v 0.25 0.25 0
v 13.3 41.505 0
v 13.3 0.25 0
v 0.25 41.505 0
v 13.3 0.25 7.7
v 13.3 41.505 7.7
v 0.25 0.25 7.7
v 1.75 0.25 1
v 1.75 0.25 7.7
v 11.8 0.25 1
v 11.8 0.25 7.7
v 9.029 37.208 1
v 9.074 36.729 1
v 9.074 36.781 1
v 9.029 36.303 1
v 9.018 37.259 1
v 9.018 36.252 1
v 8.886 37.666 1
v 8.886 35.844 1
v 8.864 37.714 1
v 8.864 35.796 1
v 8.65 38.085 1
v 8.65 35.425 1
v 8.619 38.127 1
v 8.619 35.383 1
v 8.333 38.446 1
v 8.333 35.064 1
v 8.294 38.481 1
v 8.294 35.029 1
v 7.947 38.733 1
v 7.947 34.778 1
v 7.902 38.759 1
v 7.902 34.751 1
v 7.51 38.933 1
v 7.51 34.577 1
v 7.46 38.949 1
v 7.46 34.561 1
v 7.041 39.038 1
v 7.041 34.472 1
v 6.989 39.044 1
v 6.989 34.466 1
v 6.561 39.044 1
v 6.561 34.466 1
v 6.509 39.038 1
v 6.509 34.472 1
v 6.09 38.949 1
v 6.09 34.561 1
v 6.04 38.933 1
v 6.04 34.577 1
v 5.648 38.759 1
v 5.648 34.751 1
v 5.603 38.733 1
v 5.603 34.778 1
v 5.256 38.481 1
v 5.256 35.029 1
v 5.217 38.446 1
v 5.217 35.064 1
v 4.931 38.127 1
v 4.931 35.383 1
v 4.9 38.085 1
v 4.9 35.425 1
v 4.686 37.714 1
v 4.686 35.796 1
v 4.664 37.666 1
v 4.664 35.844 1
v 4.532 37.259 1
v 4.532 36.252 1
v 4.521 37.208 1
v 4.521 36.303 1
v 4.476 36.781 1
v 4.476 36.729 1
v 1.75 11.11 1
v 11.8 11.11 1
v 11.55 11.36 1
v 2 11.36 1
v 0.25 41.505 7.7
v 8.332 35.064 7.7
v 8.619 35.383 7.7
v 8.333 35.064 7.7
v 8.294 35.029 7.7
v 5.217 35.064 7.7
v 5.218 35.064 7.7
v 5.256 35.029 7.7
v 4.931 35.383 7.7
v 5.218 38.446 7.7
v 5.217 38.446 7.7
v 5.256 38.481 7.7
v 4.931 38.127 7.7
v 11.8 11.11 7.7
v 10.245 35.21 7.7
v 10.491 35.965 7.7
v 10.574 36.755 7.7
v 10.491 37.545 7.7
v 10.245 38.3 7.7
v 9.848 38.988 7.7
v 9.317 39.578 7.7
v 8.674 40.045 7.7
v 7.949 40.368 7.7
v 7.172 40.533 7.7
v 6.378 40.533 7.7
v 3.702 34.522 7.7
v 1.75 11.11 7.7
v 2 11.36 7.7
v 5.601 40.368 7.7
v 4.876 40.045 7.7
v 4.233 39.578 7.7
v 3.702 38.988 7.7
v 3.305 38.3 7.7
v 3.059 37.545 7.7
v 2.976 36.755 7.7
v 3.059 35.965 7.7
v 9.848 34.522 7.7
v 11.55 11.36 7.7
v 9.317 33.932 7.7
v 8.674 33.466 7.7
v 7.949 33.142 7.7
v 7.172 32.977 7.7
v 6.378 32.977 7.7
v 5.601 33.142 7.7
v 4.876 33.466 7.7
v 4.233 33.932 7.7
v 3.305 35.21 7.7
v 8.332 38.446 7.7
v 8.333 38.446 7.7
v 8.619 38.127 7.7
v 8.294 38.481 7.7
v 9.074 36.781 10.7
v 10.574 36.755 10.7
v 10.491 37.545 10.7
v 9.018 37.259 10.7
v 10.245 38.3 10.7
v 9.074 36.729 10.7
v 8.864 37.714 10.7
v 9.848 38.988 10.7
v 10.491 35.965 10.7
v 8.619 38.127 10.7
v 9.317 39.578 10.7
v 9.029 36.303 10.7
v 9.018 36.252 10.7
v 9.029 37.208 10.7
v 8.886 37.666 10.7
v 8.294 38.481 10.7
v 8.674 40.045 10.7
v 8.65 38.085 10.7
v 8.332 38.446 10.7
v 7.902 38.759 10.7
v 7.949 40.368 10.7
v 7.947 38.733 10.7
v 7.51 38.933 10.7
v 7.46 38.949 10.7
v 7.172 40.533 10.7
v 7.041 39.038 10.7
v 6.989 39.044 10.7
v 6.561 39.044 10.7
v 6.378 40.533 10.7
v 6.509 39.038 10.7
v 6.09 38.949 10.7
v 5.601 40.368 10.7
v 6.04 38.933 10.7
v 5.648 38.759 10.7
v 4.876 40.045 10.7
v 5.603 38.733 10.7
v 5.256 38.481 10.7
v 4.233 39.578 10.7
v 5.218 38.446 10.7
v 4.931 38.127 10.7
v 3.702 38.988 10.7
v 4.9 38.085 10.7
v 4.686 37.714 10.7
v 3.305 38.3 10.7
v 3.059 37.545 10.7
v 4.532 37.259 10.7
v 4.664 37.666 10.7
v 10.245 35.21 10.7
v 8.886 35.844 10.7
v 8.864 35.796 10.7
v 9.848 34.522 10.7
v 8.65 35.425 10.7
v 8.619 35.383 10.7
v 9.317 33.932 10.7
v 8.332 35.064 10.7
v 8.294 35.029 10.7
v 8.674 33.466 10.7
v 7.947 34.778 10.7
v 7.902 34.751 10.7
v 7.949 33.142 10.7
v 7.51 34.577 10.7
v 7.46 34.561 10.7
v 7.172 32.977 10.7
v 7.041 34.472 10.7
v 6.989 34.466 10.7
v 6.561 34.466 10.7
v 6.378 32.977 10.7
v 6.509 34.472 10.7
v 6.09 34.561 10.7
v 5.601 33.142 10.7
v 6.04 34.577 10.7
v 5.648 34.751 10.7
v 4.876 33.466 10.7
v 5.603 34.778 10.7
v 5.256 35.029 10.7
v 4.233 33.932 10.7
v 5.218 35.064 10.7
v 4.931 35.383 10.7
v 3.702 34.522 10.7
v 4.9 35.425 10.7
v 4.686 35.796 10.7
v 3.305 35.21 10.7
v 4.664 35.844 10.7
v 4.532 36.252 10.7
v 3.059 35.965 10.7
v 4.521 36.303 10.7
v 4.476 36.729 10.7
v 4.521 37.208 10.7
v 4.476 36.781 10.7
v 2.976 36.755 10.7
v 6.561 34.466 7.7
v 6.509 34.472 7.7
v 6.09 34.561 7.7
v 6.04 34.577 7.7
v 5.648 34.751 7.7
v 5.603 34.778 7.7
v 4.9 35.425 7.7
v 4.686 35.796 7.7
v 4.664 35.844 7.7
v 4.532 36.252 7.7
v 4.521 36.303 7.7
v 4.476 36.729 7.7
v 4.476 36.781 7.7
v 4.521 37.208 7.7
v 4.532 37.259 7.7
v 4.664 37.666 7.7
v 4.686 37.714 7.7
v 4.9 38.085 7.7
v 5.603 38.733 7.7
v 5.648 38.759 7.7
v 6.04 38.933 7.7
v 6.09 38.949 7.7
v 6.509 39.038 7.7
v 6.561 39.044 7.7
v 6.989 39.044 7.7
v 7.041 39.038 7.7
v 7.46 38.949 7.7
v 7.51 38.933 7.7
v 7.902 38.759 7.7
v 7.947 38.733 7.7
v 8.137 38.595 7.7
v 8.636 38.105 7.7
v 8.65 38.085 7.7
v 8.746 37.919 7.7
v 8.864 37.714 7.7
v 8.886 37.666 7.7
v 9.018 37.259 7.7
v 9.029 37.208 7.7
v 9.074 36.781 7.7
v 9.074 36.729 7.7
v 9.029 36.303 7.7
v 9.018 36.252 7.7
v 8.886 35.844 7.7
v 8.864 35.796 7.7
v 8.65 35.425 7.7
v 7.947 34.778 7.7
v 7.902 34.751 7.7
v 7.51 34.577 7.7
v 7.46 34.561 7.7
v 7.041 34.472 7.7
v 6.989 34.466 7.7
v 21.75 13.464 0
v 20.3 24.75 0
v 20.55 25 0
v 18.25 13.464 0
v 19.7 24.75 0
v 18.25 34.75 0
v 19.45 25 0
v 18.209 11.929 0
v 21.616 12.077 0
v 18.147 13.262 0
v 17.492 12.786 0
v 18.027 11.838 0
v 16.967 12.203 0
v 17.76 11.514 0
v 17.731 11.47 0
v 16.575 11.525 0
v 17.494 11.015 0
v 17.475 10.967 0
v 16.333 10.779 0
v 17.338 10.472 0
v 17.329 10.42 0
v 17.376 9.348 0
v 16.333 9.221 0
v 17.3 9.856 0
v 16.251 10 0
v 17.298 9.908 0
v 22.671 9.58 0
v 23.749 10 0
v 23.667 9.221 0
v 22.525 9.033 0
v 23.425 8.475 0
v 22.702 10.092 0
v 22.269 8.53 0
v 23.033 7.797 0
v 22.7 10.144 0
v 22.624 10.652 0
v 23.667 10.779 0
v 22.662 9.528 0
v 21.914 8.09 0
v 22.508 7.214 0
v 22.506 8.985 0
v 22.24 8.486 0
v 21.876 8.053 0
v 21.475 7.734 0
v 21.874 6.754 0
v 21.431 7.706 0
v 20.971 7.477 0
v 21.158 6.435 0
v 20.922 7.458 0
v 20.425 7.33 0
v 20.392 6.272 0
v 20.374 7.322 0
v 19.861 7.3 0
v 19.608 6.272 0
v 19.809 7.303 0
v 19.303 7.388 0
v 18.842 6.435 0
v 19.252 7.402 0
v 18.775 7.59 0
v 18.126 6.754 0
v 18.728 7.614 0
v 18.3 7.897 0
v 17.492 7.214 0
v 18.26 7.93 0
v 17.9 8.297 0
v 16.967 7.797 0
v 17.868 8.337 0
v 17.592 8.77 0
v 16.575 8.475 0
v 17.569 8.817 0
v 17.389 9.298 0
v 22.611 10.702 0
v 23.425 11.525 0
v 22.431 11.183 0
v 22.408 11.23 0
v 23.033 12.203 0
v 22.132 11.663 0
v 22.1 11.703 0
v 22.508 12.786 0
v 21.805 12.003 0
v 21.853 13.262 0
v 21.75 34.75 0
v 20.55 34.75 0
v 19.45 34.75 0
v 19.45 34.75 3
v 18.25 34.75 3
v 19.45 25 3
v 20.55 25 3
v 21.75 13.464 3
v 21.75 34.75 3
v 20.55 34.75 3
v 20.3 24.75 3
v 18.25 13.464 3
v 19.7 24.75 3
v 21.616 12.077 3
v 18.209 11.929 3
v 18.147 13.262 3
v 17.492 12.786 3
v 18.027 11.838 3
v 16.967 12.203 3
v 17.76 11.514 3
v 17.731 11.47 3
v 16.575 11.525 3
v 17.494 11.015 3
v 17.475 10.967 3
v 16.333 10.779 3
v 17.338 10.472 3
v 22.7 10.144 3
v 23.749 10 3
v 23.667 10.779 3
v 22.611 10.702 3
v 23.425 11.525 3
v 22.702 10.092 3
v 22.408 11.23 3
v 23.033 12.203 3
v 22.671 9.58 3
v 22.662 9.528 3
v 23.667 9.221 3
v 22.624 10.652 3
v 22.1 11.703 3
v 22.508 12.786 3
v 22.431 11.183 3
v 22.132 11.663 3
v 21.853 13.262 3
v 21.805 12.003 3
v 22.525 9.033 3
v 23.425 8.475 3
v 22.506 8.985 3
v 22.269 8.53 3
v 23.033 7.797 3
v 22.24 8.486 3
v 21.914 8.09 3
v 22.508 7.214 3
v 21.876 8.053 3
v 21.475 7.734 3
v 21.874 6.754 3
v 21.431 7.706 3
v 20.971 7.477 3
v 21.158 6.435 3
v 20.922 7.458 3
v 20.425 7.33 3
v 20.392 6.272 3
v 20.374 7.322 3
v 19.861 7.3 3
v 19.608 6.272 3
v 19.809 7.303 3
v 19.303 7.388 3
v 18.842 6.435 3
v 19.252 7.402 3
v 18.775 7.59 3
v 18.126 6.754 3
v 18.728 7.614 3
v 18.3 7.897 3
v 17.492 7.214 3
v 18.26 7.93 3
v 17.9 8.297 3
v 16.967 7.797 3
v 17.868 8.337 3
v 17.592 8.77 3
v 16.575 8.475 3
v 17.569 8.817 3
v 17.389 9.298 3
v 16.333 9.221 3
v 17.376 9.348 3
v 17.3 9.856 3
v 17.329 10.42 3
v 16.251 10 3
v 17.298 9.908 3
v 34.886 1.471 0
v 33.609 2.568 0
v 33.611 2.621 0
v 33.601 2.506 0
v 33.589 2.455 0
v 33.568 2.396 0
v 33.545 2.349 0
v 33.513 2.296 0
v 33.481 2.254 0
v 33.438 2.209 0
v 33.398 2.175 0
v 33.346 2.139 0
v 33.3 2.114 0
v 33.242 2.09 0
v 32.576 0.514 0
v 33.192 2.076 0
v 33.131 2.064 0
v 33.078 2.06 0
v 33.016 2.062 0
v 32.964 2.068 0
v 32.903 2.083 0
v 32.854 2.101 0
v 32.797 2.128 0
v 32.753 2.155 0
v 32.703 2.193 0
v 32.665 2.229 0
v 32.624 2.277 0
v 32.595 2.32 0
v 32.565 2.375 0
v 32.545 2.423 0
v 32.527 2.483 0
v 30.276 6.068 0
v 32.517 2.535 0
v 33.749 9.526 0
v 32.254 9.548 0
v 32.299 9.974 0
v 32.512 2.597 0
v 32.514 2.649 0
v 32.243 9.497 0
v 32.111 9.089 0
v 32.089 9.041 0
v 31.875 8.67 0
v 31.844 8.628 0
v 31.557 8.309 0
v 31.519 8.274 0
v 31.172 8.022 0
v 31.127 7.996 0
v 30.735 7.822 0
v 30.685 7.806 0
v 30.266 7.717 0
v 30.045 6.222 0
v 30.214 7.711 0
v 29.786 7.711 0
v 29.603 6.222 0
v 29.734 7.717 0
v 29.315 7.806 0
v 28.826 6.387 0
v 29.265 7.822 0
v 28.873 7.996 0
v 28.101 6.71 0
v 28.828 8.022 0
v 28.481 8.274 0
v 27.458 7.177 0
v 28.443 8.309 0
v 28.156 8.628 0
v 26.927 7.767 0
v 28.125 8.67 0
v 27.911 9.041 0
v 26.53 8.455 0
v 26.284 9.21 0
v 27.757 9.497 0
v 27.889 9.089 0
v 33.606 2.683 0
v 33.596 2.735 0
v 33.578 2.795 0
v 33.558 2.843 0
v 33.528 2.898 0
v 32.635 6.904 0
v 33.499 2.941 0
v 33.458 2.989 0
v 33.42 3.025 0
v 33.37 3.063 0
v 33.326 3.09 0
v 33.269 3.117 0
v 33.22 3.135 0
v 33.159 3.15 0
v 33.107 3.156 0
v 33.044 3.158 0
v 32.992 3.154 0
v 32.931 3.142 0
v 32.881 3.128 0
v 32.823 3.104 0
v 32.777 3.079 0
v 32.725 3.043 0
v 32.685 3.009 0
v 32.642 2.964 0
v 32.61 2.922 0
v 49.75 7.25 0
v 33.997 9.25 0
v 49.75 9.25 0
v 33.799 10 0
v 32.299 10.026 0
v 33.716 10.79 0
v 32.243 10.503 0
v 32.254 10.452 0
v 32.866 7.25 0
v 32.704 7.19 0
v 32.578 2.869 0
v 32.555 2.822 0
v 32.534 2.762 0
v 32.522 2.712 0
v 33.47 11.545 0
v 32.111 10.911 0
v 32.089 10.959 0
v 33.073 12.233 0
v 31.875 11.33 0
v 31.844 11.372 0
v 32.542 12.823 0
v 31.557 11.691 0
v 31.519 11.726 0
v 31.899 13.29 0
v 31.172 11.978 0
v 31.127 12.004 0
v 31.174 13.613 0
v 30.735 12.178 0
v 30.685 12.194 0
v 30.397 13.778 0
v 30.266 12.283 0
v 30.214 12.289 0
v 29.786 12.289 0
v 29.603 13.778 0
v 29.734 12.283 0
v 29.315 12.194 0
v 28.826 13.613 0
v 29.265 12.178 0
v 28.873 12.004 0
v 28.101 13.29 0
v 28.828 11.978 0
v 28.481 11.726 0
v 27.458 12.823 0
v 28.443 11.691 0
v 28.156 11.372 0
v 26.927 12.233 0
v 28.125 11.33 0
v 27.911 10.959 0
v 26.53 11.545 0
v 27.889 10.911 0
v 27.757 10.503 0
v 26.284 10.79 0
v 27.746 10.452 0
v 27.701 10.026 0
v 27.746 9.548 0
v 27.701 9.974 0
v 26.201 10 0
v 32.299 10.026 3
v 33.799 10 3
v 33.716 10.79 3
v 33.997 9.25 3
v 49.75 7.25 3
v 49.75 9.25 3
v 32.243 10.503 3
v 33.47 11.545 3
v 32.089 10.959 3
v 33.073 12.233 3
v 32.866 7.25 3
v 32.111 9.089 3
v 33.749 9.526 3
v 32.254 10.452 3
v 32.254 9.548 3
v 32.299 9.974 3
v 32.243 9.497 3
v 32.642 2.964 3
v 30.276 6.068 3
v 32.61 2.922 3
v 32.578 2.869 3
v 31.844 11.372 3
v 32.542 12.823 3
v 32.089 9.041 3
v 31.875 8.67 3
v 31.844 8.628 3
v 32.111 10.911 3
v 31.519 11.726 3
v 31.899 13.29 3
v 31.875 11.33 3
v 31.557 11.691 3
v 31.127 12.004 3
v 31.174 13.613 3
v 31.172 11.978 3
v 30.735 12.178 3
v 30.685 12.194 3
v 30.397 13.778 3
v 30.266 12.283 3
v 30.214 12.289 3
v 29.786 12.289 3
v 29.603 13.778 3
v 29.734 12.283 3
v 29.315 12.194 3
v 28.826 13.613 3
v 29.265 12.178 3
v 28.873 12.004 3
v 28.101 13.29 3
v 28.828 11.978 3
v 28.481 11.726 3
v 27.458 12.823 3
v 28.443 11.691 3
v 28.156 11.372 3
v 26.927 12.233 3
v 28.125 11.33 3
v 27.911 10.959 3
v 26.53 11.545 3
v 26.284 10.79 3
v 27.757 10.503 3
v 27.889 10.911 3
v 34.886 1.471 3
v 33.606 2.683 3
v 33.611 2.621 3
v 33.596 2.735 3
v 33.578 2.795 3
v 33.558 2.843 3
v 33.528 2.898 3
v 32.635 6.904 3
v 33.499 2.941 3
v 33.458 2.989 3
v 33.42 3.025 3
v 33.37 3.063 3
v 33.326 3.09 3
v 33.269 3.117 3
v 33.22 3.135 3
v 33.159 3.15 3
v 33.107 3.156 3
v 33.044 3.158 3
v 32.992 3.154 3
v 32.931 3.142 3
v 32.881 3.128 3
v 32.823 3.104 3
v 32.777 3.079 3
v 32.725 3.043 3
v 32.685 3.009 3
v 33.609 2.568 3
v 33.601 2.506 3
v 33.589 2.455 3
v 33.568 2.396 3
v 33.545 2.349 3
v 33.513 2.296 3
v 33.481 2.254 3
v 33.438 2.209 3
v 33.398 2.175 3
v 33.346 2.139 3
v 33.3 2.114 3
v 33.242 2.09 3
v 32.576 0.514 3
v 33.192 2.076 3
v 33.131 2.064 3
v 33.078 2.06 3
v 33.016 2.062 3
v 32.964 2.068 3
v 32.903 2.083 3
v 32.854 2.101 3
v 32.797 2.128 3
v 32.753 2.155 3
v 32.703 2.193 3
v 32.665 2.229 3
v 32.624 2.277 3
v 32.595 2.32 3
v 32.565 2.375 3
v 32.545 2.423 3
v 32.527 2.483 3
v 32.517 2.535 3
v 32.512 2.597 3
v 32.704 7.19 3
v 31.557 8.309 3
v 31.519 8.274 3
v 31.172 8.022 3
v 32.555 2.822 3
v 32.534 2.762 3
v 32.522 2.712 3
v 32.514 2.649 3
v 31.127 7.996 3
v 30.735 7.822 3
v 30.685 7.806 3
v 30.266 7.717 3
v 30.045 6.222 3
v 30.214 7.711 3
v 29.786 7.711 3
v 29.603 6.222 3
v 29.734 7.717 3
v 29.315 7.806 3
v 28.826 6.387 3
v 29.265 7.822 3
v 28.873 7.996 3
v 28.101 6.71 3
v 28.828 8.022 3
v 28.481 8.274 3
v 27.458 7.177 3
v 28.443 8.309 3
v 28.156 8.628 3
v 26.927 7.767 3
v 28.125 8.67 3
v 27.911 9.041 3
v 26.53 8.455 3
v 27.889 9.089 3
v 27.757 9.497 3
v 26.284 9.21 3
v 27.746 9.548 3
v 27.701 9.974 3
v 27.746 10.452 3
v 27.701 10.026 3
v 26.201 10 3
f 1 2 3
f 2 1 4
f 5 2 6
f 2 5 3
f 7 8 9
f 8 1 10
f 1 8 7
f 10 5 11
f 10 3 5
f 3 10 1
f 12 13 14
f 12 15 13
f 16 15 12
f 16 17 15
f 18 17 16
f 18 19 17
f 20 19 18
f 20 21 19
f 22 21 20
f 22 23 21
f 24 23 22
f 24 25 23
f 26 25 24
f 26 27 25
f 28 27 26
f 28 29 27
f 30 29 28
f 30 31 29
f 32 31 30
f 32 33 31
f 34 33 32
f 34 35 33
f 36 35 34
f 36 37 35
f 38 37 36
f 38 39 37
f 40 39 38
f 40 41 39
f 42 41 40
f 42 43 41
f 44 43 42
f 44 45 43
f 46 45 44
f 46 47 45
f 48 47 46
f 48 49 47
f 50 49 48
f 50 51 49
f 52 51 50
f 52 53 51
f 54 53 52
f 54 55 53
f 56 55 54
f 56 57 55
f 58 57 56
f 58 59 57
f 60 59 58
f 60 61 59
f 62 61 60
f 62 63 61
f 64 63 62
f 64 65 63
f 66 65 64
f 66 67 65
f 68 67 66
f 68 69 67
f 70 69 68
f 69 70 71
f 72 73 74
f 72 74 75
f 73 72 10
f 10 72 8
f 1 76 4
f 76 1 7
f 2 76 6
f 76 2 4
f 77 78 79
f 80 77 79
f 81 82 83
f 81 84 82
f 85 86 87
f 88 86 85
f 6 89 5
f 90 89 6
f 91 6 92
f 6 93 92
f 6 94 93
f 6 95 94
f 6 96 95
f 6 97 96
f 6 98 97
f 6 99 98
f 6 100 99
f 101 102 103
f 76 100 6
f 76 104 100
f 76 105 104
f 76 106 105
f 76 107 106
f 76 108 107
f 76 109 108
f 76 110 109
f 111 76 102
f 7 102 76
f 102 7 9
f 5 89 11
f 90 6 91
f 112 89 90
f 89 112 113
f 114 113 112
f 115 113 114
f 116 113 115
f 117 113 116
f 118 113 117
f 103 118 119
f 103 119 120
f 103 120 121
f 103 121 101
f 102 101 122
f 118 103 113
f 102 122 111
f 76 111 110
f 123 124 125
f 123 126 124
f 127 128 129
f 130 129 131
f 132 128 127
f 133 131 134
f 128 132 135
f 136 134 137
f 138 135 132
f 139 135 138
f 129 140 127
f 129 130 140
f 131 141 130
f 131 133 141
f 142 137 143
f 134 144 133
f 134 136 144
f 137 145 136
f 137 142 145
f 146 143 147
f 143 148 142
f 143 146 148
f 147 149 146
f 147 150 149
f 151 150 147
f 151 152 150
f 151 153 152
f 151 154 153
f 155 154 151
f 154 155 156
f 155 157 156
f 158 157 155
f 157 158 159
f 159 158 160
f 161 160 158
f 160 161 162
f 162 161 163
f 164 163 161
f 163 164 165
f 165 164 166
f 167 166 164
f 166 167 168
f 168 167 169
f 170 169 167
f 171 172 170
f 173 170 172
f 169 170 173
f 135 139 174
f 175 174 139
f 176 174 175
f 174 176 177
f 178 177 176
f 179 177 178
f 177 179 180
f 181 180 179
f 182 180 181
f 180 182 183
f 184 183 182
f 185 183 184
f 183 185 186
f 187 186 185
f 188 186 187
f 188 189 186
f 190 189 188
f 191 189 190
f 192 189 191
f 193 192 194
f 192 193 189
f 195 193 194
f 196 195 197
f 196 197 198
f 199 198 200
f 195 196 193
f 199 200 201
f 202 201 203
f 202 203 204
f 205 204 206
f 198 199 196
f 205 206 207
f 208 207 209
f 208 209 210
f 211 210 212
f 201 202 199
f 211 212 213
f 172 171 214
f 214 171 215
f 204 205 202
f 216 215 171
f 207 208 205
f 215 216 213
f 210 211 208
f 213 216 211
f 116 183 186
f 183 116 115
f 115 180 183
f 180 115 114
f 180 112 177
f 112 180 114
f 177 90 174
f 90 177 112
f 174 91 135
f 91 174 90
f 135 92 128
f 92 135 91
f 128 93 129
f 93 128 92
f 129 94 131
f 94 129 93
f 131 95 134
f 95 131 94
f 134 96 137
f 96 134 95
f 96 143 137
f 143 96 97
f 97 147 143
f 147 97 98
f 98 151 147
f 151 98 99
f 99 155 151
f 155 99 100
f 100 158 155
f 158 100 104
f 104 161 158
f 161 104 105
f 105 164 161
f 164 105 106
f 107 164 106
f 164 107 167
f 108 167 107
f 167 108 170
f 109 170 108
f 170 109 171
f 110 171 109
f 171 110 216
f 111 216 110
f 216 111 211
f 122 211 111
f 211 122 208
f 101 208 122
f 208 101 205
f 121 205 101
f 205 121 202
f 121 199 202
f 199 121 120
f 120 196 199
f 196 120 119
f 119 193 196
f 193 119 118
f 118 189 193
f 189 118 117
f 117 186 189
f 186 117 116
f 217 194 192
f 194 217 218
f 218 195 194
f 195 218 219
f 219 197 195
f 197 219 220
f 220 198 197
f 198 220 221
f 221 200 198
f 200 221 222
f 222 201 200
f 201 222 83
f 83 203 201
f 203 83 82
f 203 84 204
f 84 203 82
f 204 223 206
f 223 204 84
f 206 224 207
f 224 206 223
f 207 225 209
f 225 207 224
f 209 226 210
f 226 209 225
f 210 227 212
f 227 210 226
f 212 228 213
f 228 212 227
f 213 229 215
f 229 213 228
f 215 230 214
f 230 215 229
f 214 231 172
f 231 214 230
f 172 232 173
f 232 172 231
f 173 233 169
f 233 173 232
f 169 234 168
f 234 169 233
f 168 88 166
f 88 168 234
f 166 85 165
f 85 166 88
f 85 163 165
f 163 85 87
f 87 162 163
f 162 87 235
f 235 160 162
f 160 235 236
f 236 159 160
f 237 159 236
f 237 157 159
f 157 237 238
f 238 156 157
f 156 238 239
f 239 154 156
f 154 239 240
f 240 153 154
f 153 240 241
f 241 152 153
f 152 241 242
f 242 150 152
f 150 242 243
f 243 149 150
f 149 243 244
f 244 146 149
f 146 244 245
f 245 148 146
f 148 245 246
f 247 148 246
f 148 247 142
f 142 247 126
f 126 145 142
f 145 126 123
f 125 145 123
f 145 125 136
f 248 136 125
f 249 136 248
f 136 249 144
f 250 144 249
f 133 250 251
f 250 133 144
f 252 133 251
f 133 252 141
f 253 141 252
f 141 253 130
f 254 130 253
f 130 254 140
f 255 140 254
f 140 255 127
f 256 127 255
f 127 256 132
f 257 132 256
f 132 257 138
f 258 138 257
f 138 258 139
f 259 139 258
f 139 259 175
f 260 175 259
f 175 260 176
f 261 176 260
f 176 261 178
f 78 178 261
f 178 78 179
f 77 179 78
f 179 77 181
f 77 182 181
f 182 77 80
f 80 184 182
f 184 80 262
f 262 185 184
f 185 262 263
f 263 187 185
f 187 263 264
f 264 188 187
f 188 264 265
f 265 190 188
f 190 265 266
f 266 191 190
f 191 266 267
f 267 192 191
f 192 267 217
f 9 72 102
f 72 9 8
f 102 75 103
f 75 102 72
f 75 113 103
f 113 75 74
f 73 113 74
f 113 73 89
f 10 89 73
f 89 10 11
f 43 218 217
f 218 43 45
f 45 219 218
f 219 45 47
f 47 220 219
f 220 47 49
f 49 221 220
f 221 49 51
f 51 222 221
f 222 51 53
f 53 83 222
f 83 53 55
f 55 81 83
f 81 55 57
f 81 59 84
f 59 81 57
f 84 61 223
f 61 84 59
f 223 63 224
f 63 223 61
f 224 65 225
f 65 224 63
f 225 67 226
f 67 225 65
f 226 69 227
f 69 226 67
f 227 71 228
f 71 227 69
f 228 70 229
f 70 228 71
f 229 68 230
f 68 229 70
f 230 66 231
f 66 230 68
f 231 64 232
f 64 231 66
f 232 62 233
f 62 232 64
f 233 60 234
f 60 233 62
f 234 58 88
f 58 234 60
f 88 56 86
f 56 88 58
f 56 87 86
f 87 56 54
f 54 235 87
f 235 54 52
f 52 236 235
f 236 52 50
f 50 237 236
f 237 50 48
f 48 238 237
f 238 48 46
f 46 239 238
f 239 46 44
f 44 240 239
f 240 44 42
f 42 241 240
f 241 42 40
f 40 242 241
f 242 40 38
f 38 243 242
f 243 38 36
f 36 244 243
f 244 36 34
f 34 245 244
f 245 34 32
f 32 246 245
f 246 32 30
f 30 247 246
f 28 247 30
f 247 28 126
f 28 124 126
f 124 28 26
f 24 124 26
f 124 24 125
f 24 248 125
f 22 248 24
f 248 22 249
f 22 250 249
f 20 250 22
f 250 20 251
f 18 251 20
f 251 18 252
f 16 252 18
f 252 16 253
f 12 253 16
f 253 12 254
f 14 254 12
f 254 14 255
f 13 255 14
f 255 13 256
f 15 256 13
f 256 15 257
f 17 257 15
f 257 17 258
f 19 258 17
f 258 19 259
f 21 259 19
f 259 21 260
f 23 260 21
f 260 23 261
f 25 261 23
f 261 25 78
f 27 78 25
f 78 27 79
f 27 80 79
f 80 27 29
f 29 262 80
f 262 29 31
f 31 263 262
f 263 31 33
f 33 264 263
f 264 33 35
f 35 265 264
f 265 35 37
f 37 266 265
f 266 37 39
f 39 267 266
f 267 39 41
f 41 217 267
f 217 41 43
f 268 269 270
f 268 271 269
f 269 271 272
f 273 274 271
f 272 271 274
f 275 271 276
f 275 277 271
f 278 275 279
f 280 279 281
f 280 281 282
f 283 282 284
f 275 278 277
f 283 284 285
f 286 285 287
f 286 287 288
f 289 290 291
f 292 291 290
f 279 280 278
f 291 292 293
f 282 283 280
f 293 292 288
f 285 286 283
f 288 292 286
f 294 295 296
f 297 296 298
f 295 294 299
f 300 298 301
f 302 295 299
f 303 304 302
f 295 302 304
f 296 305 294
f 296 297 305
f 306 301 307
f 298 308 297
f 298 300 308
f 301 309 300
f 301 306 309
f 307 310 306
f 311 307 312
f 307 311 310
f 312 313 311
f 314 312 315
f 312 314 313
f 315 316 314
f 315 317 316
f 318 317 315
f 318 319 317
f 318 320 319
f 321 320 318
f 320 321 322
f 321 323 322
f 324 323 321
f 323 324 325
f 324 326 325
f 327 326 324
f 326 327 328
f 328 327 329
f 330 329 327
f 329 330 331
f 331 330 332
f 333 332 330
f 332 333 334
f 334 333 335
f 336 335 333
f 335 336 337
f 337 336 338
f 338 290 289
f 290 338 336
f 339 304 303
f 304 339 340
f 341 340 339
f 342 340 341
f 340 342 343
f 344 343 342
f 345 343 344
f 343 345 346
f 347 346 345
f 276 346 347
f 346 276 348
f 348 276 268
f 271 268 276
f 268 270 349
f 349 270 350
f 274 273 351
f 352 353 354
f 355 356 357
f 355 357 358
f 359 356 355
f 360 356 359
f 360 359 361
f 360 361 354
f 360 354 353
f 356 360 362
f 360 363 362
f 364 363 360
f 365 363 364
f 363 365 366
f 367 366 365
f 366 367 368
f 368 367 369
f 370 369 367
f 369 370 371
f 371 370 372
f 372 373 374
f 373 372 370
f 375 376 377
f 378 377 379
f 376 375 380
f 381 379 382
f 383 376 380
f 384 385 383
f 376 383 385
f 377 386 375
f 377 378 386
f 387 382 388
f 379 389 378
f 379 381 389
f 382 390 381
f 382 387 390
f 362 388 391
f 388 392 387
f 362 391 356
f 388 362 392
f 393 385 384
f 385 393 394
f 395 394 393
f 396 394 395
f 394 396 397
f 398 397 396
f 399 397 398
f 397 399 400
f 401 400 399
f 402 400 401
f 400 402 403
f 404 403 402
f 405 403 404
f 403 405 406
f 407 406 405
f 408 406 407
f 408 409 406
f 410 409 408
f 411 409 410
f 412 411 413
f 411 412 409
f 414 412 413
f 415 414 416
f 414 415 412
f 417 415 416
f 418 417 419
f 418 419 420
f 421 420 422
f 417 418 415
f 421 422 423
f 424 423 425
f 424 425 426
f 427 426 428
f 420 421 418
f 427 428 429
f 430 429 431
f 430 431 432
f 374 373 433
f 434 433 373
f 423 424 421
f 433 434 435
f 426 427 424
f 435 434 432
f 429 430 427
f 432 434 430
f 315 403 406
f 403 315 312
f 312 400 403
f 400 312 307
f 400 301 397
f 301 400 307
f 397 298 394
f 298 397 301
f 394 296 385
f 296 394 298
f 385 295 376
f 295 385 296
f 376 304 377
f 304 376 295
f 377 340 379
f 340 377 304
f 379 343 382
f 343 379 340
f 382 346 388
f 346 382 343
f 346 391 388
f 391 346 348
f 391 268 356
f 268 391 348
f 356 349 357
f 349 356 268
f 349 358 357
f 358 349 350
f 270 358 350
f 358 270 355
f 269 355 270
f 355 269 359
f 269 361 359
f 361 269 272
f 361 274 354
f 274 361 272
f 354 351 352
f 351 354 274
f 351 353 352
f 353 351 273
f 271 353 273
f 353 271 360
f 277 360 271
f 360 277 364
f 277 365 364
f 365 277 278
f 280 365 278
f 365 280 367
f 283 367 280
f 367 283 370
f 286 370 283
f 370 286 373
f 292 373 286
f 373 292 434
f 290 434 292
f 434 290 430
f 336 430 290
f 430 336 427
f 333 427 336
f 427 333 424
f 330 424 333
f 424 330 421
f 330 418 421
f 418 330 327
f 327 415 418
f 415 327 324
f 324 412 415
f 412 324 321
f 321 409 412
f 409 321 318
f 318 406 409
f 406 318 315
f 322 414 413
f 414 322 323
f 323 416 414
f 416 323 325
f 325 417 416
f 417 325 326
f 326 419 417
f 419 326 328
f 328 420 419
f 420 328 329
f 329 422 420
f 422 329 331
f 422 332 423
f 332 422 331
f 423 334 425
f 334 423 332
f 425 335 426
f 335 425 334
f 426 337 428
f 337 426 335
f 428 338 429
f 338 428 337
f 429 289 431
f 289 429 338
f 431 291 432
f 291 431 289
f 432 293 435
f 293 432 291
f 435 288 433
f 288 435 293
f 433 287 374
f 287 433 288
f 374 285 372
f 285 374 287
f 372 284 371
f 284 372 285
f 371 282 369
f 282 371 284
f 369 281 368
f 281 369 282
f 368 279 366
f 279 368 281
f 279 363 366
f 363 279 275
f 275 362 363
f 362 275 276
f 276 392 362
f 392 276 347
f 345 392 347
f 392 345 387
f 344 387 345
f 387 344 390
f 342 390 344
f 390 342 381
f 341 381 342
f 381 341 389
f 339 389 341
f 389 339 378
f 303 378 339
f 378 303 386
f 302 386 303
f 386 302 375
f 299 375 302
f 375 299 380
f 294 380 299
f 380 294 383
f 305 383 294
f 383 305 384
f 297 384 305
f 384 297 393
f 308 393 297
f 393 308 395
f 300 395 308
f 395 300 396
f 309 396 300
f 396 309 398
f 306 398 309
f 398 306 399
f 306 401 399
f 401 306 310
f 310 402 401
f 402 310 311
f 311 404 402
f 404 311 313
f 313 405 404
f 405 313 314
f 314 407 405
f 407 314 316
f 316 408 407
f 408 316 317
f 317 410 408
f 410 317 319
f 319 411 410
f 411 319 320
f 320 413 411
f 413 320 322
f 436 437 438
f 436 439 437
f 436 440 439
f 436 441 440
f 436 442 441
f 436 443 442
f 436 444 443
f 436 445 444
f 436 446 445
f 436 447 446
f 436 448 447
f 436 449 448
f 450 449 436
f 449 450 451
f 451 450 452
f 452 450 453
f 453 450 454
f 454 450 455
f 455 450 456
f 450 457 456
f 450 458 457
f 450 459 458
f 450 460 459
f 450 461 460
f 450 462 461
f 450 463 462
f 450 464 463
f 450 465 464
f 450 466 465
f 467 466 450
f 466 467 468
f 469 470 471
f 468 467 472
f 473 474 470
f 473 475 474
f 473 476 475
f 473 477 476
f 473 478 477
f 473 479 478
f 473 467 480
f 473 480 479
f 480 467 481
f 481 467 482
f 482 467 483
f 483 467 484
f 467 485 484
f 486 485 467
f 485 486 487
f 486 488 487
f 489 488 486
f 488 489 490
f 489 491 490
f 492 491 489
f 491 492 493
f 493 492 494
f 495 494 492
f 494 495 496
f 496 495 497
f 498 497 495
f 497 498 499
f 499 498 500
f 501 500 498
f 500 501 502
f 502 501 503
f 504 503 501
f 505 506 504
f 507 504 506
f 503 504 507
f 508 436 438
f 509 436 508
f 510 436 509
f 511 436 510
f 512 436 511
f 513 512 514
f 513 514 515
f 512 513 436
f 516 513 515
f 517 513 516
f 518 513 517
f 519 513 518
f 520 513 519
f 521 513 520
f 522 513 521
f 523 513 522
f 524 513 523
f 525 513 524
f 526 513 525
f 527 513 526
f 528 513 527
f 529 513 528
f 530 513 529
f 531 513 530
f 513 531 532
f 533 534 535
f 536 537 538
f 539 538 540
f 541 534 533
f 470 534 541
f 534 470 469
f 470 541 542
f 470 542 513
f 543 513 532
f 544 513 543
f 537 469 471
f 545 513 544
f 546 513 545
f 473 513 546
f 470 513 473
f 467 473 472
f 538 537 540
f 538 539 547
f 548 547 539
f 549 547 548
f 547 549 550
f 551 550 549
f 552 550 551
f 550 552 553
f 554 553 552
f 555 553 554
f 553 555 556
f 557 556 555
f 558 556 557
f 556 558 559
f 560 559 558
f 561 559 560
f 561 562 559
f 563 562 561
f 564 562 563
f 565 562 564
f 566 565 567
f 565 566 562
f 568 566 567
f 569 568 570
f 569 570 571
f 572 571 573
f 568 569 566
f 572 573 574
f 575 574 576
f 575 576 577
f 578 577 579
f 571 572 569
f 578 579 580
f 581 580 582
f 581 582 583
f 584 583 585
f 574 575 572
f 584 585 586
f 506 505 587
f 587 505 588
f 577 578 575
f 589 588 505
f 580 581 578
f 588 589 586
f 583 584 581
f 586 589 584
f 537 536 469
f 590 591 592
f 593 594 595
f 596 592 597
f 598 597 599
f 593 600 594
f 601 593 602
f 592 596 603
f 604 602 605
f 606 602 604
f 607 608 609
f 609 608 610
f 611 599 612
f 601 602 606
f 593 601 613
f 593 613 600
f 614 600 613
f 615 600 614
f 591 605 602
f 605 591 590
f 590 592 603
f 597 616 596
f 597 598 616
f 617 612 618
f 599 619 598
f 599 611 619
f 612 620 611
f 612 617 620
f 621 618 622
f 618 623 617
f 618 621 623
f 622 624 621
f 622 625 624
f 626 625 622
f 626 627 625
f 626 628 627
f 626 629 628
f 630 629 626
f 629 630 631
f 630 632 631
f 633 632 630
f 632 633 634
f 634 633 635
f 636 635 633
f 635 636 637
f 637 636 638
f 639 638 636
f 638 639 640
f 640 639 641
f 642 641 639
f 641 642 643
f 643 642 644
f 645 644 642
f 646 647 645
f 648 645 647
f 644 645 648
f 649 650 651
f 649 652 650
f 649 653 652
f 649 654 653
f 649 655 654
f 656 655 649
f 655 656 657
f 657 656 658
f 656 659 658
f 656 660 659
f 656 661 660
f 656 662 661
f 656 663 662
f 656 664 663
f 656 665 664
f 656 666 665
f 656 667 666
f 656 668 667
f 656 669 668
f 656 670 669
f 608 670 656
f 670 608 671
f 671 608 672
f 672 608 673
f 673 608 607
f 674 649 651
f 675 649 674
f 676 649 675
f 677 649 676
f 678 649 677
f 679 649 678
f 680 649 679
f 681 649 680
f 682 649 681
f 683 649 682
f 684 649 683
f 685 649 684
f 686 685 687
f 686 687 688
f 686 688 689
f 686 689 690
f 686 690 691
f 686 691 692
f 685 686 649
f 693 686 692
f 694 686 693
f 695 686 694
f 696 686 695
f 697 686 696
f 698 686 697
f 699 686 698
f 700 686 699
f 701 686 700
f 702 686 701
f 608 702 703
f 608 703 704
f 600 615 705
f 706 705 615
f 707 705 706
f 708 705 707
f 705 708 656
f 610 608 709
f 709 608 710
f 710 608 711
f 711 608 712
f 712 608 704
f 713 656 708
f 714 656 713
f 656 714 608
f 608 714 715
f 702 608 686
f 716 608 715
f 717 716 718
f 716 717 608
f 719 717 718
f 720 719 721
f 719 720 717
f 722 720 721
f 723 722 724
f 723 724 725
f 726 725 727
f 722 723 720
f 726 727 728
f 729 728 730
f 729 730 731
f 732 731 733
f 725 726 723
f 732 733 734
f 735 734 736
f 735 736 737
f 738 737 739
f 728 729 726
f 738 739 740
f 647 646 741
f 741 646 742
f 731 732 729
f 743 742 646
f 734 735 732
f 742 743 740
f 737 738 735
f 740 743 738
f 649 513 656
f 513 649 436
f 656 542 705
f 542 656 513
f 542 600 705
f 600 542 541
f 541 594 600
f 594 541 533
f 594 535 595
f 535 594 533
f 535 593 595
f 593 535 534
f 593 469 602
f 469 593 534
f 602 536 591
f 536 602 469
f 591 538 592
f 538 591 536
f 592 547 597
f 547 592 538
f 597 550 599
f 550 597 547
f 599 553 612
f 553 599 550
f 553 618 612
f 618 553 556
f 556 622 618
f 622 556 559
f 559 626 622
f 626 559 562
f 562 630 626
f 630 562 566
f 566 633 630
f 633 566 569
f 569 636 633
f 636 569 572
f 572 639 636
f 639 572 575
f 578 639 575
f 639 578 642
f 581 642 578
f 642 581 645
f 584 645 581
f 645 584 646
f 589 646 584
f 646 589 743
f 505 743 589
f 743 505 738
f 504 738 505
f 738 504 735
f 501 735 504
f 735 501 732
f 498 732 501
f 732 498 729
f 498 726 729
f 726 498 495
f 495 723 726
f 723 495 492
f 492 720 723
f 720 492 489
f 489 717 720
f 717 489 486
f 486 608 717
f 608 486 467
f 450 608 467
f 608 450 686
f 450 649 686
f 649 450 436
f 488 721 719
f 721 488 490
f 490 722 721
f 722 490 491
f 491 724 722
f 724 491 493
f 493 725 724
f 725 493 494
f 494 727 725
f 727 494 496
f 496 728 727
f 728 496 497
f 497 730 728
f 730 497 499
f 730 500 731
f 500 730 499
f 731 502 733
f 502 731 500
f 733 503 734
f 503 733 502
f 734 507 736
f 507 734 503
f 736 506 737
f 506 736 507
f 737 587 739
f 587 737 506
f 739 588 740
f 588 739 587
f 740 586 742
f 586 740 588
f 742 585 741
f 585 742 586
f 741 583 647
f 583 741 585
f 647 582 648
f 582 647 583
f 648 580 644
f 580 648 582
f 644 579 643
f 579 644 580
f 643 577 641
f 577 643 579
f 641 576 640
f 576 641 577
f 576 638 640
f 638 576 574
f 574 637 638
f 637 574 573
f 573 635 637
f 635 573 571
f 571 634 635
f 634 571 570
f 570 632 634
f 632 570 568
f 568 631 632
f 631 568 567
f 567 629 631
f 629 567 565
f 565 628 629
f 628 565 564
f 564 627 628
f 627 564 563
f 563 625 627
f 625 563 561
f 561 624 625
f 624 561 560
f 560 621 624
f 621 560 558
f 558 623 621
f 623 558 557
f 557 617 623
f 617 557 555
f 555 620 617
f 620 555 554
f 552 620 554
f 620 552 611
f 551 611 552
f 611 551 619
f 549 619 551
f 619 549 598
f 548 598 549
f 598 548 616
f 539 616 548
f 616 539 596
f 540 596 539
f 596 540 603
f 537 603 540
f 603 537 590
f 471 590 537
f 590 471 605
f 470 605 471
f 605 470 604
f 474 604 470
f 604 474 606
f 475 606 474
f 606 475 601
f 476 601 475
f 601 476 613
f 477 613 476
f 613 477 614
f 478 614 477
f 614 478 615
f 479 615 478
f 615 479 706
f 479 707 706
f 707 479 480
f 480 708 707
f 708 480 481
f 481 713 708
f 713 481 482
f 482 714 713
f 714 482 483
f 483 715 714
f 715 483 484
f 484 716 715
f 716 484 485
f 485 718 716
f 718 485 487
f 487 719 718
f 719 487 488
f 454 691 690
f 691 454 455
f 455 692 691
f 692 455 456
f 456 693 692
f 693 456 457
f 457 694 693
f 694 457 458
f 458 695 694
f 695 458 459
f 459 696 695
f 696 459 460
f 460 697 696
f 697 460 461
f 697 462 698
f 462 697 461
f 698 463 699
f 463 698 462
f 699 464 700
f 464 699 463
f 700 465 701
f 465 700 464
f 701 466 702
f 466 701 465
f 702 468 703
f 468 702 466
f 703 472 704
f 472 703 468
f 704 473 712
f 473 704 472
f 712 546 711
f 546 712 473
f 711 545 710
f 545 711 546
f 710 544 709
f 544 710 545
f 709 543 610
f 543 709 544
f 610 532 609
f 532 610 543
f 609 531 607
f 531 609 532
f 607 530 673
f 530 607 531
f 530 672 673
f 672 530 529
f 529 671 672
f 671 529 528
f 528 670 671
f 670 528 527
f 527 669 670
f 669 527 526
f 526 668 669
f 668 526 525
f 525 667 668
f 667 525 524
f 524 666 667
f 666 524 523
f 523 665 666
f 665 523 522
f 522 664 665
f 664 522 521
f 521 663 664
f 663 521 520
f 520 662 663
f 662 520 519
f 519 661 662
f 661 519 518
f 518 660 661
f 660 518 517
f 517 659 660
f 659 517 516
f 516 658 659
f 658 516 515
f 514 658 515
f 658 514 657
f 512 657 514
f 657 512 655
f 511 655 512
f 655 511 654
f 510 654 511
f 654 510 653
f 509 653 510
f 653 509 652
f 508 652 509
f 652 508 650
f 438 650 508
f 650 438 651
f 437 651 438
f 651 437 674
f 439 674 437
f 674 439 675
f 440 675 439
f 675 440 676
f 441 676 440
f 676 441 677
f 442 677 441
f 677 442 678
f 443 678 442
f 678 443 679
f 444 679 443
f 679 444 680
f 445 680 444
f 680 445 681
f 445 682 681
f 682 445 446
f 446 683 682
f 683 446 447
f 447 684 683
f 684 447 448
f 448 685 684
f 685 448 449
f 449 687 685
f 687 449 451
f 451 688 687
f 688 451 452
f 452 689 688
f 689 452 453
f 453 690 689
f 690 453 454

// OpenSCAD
print_compensation = -0.25;
module shaft() {
    difference() {
        circle(d=4.91, $fn=30);
        translate([-4, -4.91/2 + 4.21]) {
            square([8, 3]);
        }
    }
}

slot_width = 0.6;
linkage_width = 4;
linkage_length = 25;

module linkage() {
    offset(print_compensation) {
        difference() {
            union() {
                circle(d=8, $fn=30);
                translate([-linkage_width/2, 0]) {
                    square([linkage_width, linkage_length]);
                }
            }
            translate([-slot_width/2, linkage_length - 10]) {
                square([slot_width, 10]);
            }
            rotate([0, 0, 2.5]) {
                shaft();
            }
        }
    }
}


throttle_shaft_diameter = 4.1;
throttle_rotation = 45;
pot_rotation = 15;
throttle_linkage_length = 8;
throttle_linkage_width = 3;


calculated_linkage_length = throttle_linkage_length * sin(throttle_rotation/2) / sin(pot_rotation/2);
echo(calculated_linkage_length);

module throttle() {
    offset(print_compensation) {
        difference() {
            union() {
                circle(d=throttle_shaft_diameter + 4, $fn=30);
                translate([0, -3]) {
                    square([20, 2.5]);
                }
                rotate([0, 0, -180 + throttle_rotation/2]) {
                    translate([-throttle_linkage_width/2, 0]) {
                        difference() {
                            square([throttle_linkage_width, throttle_linkage_length + 2]);
                            translate([throttle_linkage_width/2, throttle_linkage_length]) {
                                circle(d=0.6, $fn=30);
                            }
                        }
                    }
                }
            }
            circle(d=throttle_shaft_diameter, $fn=30);
        }
    }
}

pot_axis_top_offset = 5;

case_thickness = 5.35;
case_width = 9.55;
case_height = 11.11;

thickness = 6.7;

base_thickness = 1;

border=2;


combined_linkage_linear_length = calculated_linkage_length * cos(pot_rotation/2) + throttle_linkage_length * cos(throttle_rotation/2);

module base() {
    offset(print_compensation) {
        difference() {
            square([case_width + border*2, case_height - pot_axis_top_offset + combined_linkage_linear_length + 5]);
            translate([border, 0]) {
                square([case_width, case_height]);
            }
            translate([case_width/2 + border, case_height - pot_axis_top_offset + combined_linkage_linear_length]) {
                circle(d=throttle_shaft_diameter, $fn=30);
            }
        }
    }
}

module 3dbase() {
    linear_extrude(height=base_thickness) {
        offset(print_compensation) {
            square([case_width + border * 2, case_height - pot_axis_top_offset + combined_linkage_linear_length + 5]);
        }
    }
    
    translate([case_width/2 + border, case_height - pot_axis_top_offset + combined_linkage_linear_length, base_thickness + 6.7]) {
        linear_extrude(height=3) {
            offset(print_compensation) {
                difference() {
                    circle(d=throttle_shaft_diameter + 4, $fn=30);
                    circle(d=throttle_shaft_diameter, $fn=30);
                }
            }
        }
    }
    translate([0, 0, base_thickness]) {
        linear_extrude(height=6.7) {
            base();
        }
    }
}


module assembled() {
    3dbase();
    translate([case_width/2 + border, case_height - pot_axis_top_offset, 6.7 + base_thickness]) {
        linear_extrude(height=3) {
            rotate([0, 0, -pot_rotation/2])
            linkage();
        }
    }
    translate([case_width/2 + border, case_height - pot_axis_top_offset + combined_linkage_linear_length, 6.7 + 3 + base_thickness]) {
        linear_extrude(height=3) {
            //rotate([0, 0, -throttle_rotation])
            throttle();
        }
    }
}

module for_print() {
    3dbase();
    translate([20, 10, 0]) {
        linear_extrude(height=3) {
            linkage();
        }
    }
    translate([30, 10, 0]) {
        linear_extrude(height=3) {
            throttle();
        }
    }
}

//assembled();
for_print();
